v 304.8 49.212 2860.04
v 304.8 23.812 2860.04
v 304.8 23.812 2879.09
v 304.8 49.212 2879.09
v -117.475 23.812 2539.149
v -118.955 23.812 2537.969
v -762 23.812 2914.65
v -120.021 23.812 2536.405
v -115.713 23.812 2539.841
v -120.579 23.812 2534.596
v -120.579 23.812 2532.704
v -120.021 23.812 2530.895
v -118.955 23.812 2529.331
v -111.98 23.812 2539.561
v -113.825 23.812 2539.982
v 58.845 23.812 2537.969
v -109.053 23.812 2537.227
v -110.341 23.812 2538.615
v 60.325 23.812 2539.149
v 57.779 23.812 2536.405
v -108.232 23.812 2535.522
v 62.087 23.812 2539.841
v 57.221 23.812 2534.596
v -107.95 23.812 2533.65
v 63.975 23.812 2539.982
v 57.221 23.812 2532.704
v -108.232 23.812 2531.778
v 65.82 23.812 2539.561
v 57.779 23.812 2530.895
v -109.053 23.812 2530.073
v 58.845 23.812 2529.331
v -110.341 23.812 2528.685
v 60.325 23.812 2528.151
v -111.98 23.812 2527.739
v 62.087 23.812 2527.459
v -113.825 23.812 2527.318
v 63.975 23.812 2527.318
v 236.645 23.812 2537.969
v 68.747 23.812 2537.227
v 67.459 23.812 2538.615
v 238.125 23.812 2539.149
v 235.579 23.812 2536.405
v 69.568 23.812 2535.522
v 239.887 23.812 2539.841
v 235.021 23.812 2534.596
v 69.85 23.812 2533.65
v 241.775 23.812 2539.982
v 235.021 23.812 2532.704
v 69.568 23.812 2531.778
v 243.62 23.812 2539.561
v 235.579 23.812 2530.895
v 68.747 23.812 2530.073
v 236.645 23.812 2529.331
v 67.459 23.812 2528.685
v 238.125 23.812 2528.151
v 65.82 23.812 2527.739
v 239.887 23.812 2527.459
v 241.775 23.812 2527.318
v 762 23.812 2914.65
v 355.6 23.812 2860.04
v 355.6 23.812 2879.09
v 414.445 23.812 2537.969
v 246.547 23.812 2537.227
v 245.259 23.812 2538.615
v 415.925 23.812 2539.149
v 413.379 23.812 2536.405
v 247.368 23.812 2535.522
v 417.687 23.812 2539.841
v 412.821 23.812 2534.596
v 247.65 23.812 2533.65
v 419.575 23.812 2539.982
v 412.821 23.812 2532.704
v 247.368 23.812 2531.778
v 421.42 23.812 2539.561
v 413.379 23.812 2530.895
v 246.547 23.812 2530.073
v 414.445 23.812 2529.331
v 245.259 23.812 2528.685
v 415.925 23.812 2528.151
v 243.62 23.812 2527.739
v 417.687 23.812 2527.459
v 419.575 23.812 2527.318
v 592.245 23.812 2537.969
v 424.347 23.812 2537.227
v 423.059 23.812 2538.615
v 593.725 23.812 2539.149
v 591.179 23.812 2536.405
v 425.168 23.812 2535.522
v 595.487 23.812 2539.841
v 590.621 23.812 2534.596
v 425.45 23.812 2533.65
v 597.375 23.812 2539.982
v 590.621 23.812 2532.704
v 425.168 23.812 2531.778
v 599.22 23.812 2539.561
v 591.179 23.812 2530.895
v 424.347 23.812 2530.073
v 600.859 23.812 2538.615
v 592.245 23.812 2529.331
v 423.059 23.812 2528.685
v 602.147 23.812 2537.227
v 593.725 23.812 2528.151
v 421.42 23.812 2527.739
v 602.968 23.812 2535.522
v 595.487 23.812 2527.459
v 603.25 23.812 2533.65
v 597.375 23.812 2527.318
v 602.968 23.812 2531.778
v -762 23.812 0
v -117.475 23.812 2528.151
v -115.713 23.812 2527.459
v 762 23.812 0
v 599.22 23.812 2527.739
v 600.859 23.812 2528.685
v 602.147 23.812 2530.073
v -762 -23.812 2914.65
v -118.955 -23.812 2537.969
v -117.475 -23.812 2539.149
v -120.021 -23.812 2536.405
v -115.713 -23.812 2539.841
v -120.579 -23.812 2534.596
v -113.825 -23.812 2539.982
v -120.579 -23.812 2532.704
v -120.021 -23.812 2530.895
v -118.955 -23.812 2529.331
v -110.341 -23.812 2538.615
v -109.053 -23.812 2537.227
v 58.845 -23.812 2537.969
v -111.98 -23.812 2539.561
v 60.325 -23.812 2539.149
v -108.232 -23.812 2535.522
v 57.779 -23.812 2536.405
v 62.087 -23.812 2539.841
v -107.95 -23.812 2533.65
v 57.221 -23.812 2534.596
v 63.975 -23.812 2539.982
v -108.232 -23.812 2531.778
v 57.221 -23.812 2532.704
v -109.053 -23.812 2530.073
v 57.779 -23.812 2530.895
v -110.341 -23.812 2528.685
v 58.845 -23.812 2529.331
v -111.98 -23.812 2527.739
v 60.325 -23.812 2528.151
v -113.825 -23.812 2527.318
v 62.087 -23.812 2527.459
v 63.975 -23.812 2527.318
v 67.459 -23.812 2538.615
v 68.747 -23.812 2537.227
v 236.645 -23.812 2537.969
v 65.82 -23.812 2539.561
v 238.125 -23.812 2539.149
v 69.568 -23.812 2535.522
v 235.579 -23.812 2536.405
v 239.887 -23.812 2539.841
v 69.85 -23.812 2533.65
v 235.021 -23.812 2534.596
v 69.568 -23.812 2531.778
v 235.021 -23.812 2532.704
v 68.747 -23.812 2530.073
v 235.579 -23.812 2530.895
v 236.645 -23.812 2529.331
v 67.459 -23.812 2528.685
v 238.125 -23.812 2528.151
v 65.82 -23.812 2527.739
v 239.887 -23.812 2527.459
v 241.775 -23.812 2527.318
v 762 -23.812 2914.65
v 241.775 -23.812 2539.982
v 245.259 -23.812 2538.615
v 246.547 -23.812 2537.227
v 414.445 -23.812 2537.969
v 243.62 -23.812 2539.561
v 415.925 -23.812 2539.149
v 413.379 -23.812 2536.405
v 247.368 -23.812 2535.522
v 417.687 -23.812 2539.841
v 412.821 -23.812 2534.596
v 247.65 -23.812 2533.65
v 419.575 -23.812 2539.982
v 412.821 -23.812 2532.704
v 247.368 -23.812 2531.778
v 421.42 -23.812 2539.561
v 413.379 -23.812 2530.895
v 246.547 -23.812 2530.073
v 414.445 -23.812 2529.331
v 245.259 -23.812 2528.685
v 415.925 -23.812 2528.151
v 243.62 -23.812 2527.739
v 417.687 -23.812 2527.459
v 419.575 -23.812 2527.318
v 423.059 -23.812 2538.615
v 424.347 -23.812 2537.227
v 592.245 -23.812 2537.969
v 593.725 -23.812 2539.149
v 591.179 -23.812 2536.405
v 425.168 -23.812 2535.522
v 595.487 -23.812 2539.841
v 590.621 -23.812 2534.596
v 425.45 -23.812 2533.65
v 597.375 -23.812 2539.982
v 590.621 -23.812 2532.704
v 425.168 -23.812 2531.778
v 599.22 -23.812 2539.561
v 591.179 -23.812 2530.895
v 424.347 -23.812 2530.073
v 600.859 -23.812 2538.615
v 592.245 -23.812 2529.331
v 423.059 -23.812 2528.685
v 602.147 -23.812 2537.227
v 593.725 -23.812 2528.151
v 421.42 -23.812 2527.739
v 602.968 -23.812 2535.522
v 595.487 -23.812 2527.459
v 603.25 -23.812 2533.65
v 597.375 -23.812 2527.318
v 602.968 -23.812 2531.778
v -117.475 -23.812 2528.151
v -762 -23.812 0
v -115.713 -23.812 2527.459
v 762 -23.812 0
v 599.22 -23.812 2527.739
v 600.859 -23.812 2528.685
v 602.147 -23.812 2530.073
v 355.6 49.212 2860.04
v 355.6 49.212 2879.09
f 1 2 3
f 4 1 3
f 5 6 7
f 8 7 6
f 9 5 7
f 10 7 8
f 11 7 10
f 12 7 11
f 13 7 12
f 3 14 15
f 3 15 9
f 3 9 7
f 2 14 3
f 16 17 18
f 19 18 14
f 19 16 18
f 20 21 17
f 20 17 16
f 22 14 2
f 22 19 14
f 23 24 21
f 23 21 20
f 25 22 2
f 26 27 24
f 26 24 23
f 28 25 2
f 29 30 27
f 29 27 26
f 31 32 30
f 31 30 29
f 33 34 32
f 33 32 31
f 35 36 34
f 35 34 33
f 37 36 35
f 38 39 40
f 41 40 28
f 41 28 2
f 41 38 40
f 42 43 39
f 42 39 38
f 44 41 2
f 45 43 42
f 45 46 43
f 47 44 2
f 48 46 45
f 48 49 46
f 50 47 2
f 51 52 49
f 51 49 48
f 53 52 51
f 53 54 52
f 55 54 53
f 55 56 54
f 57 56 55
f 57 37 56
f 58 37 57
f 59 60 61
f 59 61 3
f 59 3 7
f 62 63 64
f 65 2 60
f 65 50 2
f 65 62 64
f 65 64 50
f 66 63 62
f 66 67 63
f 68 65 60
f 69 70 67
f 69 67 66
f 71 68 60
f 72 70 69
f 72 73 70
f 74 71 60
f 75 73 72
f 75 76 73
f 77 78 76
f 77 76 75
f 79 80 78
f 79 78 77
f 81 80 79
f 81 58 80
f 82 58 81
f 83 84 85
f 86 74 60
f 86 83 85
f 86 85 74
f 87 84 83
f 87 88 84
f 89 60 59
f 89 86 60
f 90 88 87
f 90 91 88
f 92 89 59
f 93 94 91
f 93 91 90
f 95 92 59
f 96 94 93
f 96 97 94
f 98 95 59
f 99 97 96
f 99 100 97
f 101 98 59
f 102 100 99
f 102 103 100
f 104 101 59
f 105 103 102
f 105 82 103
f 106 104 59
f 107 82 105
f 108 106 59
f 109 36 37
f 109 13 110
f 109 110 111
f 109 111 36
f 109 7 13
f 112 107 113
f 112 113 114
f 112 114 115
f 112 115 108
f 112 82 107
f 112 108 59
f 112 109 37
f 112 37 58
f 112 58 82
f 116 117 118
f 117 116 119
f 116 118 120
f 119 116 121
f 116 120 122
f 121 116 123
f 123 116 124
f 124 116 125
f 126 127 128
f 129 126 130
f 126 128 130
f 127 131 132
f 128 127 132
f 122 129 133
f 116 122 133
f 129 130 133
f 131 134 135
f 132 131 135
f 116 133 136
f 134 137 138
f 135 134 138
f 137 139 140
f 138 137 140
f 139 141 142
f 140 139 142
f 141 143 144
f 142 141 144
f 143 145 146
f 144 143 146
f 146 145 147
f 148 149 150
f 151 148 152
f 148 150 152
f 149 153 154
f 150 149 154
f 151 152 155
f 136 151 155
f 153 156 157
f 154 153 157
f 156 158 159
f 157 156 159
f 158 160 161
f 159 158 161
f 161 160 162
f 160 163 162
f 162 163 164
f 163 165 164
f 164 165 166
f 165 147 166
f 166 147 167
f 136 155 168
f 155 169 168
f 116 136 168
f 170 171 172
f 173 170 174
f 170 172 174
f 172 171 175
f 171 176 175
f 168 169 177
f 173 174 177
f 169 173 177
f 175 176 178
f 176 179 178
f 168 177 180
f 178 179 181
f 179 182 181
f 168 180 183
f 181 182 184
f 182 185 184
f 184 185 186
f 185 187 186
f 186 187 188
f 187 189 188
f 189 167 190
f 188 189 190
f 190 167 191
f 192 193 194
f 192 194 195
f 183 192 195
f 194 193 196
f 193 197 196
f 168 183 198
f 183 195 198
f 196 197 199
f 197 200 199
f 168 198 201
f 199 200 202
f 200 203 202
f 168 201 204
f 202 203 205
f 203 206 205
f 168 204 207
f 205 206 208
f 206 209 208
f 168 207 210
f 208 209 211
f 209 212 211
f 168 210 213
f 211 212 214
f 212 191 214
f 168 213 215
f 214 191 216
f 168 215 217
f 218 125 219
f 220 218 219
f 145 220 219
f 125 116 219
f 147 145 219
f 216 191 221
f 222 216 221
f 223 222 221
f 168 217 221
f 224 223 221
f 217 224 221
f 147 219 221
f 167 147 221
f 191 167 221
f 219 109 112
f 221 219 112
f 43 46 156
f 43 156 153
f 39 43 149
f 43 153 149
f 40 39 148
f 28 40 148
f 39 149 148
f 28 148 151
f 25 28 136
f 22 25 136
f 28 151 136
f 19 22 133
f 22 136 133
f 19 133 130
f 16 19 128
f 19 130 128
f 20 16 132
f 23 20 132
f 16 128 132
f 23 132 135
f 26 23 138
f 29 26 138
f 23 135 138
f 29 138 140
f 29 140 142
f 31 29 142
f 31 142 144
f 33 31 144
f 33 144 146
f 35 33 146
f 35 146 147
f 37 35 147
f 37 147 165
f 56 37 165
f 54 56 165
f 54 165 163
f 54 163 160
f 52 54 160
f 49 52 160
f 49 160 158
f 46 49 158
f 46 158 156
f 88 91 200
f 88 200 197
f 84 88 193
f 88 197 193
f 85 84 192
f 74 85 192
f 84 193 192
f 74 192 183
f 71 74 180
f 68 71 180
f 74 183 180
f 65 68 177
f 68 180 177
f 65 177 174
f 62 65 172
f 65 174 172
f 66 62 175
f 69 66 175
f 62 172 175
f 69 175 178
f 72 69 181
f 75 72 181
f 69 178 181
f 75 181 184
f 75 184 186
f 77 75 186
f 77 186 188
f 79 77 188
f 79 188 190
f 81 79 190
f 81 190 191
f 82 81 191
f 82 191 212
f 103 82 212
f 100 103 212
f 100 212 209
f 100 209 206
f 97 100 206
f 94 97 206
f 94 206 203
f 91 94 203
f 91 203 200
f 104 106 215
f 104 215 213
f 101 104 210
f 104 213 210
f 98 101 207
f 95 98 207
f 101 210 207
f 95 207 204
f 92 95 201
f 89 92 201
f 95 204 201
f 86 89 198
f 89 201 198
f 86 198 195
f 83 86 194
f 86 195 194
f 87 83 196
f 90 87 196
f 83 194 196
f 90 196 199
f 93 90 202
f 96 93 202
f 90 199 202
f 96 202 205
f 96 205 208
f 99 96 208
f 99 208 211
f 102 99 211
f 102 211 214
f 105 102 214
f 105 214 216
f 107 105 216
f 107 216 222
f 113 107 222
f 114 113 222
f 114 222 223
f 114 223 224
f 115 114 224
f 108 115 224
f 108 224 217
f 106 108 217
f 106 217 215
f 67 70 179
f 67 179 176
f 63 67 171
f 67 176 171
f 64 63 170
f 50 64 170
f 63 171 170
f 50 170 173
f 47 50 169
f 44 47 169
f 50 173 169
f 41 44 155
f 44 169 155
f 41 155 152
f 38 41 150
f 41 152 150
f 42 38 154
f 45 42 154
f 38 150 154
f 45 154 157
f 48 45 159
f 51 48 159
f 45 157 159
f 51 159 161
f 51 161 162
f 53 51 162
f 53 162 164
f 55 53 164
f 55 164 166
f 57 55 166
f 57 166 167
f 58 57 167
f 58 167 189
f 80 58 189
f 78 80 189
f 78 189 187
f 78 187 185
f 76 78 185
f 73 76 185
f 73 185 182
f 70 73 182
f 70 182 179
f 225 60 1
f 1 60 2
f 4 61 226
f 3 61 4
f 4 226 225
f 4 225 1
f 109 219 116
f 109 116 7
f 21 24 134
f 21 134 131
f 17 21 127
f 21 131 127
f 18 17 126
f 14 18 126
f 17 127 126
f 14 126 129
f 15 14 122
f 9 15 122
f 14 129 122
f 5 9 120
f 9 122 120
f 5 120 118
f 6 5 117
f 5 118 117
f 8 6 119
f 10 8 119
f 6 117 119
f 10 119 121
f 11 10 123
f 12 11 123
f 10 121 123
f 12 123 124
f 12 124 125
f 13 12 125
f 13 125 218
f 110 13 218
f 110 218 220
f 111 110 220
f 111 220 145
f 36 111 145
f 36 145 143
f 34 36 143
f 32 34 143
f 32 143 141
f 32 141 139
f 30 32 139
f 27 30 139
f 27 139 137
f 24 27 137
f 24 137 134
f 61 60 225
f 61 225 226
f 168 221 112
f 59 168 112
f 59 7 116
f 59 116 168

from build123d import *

# Parameters (mm, degrees)
F0_W     = 1524
F0_H     = 47.625
F1_DEPTH = 2914.65
F2_R     = 6.35
F3_DEPTH = 47.626
F4_W     = 50.8
F4_H     = 19.05
F5_DEPTH = 25.4


with BuildPart() as f1:
    # F0 (on Top) → F1 (new body)
    with BuildSketch(Plane.XY):
        Rectangle(F0_W, F0_H)
    extrude(amount=F1_DEPTH)

    # F2 (on face) → F3 (cut, through all)
    with BuildSketch(Plane.XZ.offset(23.8125)):
        with Locations((-114.3, 2533.65)):
            Circle(F2_R)
        with Locations((63.5, 2533.65)):
            Circle(F2_R)
        with Locations((241.3, 2533.65)):
            Circle(F2_R)
        with Locations((419.1, 2533.65)):
            Circle(F2_R)
        with Locations((596.9, 2533.65)):
            Circle(F2_R)
    extrude(amount=-F3_DEPTH, mode=Mode.SUBTRACT)

    # F4 (on face) → F5 (join)
    with BuildSketch(Plane(origin=(0, 23.8125, 0), x_dir=(-1, 0, 0), z_dir=(0, 1, 0))):
        with Locations((-330.2, 2869.565)):
            Rectangle(F4_W, F4_H)
    extrude(amount=F5_DEPTH)


solid = f1.part
